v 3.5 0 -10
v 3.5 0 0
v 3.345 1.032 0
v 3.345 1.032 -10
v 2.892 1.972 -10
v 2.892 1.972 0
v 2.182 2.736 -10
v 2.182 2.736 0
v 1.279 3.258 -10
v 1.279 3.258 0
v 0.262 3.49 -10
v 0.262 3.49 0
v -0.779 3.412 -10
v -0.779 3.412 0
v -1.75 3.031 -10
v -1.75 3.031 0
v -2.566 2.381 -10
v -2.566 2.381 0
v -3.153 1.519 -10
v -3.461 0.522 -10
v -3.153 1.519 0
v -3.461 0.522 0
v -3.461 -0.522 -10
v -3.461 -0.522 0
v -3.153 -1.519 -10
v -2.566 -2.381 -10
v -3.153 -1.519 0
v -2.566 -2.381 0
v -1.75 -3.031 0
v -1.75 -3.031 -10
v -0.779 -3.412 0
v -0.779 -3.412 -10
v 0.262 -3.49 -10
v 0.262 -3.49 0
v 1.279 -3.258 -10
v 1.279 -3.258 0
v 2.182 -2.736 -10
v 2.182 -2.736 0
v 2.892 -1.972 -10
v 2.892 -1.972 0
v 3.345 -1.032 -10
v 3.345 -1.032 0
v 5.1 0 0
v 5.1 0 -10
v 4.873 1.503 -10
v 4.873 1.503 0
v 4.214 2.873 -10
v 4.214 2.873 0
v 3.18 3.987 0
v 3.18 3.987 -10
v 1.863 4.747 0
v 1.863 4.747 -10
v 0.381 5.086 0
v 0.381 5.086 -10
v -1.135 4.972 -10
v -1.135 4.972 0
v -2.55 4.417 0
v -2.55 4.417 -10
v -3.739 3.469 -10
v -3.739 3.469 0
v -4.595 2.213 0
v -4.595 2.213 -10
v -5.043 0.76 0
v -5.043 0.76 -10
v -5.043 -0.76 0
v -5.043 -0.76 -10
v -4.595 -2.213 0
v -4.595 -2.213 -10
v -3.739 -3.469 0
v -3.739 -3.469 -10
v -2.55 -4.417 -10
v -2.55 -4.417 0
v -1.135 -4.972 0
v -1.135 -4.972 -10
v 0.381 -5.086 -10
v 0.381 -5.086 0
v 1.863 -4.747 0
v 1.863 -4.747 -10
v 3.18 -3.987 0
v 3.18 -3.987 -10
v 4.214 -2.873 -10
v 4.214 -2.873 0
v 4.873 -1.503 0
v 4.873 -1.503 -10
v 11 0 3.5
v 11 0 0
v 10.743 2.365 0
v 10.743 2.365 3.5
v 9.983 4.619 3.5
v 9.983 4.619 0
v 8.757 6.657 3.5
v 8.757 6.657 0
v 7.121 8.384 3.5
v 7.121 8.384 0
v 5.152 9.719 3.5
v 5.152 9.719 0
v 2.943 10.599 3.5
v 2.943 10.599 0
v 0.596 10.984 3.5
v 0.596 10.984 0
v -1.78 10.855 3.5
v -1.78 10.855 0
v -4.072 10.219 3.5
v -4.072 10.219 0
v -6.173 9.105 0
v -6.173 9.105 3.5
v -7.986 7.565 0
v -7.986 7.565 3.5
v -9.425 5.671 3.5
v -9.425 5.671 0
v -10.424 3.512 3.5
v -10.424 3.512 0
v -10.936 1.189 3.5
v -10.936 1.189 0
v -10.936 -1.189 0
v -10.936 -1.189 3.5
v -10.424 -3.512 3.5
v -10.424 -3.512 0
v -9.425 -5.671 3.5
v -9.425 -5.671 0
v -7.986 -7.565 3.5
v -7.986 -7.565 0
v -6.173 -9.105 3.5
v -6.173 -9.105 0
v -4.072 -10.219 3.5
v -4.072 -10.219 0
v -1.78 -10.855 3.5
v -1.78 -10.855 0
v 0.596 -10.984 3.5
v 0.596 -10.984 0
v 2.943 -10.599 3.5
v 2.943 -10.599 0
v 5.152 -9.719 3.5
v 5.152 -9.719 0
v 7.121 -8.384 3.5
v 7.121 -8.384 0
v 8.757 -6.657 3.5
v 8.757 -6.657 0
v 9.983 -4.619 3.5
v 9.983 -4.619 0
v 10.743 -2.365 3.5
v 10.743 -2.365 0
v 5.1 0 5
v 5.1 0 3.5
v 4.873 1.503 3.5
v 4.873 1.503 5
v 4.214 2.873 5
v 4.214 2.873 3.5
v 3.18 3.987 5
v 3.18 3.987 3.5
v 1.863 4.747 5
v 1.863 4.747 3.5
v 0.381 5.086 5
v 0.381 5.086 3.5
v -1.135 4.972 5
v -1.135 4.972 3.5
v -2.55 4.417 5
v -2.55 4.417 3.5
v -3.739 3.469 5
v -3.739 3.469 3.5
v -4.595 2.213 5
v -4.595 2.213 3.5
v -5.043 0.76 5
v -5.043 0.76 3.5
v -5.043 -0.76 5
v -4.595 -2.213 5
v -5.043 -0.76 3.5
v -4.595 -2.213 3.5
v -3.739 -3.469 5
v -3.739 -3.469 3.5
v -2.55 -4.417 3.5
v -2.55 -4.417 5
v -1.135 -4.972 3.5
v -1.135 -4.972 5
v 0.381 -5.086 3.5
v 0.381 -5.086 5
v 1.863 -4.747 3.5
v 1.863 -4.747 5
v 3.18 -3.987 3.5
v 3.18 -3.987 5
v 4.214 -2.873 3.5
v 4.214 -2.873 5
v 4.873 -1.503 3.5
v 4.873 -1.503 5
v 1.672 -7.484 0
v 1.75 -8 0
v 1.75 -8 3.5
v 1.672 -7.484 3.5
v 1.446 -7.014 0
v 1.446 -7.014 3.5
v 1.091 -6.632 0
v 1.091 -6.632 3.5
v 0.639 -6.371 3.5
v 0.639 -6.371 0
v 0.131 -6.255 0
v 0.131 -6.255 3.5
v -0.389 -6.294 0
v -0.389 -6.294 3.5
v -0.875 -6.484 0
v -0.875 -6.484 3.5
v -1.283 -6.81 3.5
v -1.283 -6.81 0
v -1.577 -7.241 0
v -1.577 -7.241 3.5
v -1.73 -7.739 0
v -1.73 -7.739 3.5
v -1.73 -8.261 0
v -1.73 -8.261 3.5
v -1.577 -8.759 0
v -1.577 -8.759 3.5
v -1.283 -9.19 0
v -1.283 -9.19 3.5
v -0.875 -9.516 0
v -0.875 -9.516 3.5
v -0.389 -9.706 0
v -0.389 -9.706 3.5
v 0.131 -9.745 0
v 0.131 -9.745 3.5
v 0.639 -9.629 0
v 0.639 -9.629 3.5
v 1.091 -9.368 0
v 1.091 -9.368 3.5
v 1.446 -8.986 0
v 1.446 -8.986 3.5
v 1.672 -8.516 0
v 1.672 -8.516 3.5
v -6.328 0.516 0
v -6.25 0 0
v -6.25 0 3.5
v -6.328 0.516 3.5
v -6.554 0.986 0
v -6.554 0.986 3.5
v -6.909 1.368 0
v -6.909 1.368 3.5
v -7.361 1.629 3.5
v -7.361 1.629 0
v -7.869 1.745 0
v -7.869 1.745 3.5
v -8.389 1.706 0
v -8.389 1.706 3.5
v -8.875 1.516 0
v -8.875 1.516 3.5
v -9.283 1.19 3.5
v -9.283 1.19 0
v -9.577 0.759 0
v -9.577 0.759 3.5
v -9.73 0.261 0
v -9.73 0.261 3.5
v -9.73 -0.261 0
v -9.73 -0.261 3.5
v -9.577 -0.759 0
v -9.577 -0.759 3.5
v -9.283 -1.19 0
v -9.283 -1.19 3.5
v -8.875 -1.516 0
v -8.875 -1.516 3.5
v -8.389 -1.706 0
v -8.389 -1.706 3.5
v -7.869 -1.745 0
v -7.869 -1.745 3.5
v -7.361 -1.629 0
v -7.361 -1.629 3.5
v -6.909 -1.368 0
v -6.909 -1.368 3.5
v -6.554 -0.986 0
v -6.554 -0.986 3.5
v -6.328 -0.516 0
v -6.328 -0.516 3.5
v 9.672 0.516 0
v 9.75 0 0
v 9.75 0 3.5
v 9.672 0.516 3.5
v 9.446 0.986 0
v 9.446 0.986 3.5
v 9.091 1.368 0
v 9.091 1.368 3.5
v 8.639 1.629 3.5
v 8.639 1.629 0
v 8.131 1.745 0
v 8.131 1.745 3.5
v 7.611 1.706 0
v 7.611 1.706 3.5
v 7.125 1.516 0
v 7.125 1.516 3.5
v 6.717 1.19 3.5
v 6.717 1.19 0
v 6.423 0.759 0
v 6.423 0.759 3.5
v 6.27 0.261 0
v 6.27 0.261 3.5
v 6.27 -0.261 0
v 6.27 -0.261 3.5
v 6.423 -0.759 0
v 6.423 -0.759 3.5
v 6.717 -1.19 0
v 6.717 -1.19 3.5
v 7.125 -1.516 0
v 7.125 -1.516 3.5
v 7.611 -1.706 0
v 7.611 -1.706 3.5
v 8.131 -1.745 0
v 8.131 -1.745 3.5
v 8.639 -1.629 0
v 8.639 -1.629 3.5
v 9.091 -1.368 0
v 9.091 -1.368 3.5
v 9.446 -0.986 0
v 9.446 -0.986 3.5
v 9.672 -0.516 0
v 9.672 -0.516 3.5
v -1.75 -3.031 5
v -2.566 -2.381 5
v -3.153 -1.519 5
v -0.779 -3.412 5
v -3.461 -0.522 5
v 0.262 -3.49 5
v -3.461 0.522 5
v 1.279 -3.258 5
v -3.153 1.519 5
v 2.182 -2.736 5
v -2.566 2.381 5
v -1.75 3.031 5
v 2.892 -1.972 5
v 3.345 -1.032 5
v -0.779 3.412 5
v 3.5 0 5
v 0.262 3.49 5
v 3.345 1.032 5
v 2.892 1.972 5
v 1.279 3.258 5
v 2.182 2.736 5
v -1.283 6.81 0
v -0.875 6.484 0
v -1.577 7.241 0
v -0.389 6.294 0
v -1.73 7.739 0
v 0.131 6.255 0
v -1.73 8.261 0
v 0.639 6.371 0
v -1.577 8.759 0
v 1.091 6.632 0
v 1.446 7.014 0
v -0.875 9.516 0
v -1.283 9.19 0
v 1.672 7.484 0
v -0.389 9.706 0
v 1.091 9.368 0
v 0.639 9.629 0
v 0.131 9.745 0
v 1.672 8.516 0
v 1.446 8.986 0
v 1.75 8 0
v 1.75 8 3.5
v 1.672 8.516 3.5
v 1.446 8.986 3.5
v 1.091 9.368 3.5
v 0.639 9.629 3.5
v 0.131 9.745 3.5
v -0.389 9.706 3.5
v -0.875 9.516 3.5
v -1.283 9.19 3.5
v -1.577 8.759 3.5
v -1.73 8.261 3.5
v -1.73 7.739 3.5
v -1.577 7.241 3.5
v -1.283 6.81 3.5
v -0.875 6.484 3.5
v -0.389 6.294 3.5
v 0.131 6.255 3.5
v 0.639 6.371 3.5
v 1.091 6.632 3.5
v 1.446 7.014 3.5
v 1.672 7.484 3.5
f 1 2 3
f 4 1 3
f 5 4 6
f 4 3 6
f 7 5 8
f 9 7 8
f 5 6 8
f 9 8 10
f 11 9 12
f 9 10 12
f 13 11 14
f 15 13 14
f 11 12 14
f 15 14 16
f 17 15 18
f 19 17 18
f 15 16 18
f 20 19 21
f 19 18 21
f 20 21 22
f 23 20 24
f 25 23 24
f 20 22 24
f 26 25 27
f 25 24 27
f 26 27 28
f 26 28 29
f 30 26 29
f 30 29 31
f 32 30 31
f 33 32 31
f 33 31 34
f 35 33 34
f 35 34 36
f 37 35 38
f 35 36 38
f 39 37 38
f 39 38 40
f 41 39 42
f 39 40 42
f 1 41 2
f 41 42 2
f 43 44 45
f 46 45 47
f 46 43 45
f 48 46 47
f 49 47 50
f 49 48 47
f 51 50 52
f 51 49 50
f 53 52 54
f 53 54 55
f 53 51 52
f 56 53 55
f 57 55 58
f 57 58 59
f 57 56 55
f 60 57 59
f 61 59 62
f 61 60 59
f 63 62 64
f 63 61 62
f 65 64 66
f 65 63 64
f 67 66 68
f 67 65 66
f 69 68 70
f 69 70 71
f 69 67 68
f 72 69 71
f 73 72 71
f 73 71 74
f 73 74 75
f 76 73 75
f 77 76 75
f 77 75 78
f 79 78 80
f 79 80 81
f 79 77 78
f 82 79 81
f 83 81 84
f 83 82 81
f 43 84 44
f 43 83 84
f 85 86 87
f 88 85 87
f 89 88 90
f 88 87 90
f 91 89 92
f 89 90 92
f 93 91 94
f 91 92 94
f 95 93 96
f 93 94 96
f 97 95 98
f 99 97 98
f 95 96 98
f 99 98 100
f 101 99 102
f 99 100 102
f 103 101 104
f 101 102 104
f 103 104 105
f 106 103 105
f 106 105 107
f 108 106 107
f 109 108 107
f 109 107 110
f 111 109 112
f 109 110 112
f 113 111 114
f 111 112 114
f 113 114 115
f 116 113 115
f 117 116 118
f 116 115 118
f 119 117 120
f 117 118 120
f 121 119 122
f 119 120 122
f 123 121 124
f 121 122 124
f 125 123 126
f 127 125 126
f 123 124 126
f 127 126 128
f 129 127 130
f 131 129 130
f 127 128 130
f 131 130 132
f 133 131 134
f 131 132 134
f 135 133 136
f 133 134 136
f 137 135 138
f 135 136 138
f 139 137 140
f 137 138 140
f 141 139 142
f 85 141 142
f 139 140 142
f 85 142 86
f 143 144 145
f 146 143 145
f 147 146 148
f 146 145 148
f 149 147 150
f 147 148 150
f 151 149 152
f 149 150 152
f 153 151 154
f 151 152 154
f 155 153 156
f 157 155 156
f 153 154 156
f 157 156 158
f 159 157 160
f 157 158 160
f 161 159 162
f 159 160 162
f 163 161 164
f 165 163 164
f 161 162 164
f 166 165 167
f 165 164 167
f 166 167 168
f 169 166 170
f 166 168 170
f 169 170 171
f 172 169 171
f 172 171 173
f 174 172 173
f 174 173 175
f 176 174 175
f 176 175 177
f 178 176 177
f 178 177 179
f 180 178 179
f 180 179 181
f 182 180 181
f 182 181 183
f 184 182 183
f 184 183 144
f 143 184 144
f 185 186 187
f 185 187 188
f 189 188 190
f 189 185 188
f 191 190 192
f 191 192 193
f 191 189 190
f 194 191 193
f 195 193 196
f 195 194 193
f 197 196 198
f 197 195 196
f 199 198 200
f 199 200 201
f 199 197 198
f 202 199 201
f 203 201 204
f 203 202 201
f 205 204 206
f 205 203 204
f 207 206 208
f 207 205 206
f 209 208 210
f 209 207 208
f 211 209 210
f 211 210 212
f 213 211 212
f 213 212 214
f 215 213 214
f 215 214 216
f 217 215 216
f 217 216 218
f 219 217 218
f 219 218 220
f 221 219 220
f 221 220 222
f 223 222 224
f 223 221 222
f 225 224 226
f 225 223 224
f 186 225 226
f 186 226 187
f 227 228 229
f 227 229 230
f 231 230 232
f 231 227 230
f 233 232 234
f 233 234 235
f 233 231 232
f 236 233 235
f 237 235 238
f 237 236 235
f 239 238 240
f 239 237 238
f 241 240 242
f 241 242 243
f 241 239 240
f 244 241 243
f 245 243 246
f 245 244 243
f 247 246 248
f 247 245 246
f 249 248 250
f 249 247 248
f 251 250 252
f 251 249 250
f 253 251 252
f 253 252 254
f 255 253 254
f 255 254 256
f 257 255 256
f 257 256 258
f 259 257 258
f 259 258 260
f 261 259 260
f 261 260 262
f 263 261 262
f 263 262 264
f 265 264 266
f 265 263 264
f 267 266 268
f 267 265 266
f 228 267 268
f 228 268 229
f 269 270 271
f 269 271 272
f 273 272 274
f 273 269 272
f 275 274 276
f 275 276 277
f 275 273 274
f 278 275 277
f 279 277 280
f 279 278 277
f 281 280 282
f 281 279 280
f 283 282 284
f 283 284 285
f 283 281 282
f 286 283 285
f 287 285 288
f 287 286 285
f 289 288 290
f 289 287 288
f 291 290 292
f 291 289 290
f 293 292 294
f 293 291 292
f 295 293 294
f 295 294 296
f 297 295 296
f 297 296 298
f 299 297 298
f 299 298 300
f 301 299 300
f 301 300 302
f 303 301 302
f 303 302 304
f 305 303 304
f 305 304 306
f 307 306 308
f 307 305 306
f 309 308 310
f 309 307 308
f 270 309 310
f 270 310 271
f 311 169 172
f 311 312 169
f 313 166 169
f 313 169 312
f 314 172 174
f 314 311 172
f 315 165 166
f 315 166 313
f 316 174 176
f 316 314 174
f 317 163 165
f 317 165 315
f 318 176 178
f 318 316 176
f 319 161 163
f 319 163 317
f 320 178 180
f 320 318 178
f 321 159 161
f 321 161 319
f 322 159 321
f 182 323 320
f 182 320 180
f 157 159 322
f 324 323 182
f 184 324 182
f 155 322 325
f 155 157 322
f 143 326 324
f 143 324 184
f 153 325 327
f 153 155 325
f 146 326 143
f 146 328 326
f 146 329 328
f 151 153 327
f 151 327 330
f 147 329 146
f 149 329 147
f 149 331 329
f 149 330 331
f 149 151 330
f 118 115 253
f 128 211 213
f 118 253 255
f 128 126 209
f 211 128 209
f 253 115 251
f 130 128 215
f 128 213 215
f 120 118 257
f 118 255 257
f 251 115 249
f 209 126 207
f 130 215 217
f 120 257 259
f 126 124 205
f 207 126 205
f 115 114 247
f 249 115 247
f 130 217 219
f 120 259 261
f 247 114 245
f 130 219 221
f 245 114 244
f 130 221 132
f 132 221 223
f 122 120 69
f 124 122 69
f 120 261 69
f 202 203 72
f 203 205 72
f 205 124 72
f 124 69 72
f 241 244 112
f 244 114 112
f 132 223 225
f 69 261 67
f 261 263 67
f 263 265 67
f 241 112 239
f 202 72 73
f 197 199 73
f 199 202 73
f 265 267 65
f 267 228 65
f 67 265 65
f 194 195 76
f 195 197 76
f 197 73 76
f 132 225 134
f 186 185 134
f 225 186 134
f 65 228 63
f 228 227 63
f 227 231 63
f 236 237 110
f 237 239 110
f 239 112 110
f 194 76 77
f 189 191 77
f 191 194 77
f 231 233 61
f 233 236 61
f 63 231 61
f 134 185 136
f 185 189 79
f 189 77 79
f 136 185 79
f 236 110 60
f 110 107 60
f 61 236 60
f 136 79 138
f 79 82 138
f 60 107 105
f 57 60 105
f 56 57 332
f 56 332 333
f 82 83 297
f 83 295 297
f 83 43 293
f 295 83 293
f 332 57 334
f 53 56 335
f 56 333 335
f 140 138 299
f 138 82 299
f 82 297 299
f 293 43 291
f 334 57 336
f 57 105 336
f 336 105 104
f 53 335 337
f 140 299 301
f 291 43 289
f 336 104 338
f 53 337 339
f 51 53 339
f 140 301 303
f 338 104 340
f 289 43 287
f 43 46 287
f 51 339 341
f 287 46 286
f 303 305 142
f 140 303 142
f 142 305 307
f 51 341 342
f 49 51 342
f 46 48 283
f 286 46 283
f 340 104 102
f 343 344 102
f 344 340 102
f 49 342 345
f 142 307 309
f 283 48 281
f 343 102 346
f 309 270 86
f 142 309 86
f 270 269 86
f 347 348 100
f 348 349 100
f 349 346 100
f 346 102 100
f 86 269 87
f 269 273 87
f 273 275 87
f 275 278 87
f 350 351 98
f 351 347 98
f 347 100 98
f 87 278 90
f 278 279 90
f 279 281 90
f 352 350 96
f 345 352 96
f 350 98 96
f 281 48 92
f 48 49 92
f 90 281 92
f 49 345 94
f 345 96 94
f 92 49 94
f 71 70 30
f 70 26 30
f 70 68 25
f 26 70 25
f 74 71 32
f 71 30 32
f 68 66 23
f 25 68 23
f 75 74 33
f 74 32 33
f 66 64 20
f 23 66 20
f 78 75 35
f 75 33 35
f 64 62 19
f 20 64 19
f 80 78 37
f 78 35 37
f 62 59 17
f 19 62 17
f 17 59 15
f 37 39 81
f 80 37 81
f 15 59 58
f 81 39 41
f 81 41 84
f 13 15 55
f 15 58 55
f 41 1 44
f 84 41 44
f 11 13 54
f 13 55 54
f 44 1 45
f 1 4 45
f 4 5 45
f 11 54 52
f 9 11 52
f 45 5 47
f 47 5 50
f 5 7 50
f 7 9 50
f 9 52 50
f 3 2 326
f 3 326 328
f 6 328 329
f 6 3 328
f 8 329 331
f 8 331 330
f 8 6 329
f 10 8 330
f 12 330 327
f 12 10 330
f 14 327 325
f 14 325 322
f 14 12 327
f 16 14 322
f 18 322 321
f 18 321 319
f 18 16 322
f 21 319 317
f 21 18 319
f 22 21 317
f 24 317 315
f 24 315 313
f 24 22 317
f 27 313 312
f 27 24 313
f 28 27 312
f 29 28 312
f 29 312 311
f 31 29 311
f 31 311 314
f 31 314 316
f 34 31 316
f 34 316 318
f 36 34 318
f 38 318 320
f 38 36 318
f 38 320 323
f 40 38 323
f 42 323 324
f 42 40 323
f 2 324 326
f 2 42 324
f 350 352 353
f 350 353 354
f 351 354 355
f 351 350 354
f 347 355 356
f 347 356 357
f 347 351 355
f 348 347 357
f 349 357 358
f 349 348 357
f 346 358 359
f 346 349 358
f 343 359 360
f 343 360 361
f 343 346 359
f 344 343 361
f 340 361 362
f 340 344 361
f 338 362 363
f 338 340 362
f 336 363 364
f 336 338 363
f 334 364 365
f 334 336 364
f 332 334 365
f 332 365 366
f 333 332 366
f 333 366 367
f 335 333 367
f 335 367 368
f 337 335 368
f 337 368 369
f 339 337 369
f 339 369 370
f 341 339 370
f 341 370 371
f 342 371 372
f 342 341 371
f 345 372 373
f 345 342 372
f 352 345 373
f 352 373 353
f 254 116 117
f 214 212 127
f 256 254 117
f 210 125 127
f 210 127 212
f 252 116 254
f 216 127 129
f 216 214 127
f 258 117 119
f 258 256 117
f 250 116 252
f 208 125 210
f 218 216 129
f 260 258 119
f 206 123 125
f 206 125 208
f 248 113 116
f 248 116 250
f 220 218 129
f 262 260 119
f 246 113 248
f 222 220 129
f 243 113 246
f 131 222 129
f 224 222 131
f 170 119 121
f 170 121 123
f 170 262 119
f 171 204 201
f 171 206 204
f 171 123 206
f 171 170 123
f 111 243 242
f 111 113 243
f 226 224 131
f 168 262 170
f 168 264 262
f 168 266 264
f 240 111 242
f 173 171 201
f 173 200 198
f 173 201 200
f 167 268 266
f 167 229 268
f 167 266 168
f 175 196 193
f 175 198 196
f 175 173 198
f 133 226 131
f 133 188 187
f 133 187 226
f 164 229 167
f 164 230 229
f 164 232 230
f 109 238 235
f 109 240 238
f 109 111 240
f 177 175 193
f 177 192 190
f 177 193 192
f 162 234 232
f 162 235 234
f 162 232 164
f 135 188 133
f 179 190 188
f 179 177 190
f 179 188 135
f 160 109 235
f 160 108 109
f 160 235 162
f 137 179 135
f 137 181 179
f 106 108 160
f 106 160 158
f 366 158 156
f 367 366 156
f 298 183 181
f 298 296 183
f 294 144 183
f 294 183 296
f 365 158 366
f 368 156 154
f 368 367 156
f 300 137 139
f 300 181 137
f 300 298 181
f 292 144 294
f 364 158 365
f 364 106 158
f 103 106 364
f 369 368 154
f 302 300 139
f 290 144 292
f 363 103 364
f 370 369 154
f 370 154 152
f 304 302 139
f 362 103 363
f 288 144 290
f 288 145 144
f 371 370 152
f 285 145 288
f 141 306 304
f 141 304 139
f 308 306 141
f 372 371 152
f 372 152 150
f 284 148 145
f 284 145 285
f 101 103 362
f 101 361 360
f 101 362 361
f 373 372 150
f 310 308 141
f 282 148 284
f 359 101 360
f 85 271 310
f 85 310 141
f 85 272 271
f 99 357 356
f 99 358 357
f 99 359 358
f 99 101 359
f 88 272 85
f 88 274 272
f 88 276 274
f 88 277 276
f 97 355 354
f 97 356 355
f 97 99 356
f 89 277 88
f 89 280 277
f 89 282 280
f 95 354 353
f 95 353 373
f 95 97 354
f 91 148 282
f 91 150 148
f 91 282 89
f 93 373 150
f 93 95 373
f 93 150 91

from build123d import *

# Parameters (mm, degrees)
F0_R     = 11
F0_R_2   = 1.75
F0_R_3   = 5.1
F1_DEPTH = 3.5
F0_R_4   = 3.5
F2_DEPTH = 5
F3_DEPTH = 10


with BuildPart() as f1:
    # F0 (on Top) → F1 (new body)
    with BuildSketch(Plane.XY):
        Circle(F0_R)
        with Locations((0, -8)):
            Circle(F0_R_2, mode=Mode.SUBTRACT)
        with Locations((-8, 0)):
            Circle(F0_R_2, mode=Mode.SUBTRACT)
        Circle(F0_R_3, mode=Mode.SUBTRACT)
        with Locations((8, 0)):
            Circle(F0_R_2, mode=Mode.SUBTRACT)
        with Locations((0, 8)):
            Circle(F0_R_2, mode=Mode.SUBTRACT)
    extrude(amount=F1_DEPTH)

    # F0 (on Top) → F2 (join)
    with BuildSketch(Plane.XY):
        Circle(F0_R_3)
        Circle(F0_R_4, mode=Mode.SUBTRACT)
    extrude(amount=F2_DEPTH)

    # F0 (on Top) → F3 (join)
    with BuildSketch(Plane.XY):
        Circle(F0_R_3)
        Circle(F0_R_4, mode=Mode.SUBTRACT)
    extrude(amount=-F3_DEPTH)


solid = f1.part
